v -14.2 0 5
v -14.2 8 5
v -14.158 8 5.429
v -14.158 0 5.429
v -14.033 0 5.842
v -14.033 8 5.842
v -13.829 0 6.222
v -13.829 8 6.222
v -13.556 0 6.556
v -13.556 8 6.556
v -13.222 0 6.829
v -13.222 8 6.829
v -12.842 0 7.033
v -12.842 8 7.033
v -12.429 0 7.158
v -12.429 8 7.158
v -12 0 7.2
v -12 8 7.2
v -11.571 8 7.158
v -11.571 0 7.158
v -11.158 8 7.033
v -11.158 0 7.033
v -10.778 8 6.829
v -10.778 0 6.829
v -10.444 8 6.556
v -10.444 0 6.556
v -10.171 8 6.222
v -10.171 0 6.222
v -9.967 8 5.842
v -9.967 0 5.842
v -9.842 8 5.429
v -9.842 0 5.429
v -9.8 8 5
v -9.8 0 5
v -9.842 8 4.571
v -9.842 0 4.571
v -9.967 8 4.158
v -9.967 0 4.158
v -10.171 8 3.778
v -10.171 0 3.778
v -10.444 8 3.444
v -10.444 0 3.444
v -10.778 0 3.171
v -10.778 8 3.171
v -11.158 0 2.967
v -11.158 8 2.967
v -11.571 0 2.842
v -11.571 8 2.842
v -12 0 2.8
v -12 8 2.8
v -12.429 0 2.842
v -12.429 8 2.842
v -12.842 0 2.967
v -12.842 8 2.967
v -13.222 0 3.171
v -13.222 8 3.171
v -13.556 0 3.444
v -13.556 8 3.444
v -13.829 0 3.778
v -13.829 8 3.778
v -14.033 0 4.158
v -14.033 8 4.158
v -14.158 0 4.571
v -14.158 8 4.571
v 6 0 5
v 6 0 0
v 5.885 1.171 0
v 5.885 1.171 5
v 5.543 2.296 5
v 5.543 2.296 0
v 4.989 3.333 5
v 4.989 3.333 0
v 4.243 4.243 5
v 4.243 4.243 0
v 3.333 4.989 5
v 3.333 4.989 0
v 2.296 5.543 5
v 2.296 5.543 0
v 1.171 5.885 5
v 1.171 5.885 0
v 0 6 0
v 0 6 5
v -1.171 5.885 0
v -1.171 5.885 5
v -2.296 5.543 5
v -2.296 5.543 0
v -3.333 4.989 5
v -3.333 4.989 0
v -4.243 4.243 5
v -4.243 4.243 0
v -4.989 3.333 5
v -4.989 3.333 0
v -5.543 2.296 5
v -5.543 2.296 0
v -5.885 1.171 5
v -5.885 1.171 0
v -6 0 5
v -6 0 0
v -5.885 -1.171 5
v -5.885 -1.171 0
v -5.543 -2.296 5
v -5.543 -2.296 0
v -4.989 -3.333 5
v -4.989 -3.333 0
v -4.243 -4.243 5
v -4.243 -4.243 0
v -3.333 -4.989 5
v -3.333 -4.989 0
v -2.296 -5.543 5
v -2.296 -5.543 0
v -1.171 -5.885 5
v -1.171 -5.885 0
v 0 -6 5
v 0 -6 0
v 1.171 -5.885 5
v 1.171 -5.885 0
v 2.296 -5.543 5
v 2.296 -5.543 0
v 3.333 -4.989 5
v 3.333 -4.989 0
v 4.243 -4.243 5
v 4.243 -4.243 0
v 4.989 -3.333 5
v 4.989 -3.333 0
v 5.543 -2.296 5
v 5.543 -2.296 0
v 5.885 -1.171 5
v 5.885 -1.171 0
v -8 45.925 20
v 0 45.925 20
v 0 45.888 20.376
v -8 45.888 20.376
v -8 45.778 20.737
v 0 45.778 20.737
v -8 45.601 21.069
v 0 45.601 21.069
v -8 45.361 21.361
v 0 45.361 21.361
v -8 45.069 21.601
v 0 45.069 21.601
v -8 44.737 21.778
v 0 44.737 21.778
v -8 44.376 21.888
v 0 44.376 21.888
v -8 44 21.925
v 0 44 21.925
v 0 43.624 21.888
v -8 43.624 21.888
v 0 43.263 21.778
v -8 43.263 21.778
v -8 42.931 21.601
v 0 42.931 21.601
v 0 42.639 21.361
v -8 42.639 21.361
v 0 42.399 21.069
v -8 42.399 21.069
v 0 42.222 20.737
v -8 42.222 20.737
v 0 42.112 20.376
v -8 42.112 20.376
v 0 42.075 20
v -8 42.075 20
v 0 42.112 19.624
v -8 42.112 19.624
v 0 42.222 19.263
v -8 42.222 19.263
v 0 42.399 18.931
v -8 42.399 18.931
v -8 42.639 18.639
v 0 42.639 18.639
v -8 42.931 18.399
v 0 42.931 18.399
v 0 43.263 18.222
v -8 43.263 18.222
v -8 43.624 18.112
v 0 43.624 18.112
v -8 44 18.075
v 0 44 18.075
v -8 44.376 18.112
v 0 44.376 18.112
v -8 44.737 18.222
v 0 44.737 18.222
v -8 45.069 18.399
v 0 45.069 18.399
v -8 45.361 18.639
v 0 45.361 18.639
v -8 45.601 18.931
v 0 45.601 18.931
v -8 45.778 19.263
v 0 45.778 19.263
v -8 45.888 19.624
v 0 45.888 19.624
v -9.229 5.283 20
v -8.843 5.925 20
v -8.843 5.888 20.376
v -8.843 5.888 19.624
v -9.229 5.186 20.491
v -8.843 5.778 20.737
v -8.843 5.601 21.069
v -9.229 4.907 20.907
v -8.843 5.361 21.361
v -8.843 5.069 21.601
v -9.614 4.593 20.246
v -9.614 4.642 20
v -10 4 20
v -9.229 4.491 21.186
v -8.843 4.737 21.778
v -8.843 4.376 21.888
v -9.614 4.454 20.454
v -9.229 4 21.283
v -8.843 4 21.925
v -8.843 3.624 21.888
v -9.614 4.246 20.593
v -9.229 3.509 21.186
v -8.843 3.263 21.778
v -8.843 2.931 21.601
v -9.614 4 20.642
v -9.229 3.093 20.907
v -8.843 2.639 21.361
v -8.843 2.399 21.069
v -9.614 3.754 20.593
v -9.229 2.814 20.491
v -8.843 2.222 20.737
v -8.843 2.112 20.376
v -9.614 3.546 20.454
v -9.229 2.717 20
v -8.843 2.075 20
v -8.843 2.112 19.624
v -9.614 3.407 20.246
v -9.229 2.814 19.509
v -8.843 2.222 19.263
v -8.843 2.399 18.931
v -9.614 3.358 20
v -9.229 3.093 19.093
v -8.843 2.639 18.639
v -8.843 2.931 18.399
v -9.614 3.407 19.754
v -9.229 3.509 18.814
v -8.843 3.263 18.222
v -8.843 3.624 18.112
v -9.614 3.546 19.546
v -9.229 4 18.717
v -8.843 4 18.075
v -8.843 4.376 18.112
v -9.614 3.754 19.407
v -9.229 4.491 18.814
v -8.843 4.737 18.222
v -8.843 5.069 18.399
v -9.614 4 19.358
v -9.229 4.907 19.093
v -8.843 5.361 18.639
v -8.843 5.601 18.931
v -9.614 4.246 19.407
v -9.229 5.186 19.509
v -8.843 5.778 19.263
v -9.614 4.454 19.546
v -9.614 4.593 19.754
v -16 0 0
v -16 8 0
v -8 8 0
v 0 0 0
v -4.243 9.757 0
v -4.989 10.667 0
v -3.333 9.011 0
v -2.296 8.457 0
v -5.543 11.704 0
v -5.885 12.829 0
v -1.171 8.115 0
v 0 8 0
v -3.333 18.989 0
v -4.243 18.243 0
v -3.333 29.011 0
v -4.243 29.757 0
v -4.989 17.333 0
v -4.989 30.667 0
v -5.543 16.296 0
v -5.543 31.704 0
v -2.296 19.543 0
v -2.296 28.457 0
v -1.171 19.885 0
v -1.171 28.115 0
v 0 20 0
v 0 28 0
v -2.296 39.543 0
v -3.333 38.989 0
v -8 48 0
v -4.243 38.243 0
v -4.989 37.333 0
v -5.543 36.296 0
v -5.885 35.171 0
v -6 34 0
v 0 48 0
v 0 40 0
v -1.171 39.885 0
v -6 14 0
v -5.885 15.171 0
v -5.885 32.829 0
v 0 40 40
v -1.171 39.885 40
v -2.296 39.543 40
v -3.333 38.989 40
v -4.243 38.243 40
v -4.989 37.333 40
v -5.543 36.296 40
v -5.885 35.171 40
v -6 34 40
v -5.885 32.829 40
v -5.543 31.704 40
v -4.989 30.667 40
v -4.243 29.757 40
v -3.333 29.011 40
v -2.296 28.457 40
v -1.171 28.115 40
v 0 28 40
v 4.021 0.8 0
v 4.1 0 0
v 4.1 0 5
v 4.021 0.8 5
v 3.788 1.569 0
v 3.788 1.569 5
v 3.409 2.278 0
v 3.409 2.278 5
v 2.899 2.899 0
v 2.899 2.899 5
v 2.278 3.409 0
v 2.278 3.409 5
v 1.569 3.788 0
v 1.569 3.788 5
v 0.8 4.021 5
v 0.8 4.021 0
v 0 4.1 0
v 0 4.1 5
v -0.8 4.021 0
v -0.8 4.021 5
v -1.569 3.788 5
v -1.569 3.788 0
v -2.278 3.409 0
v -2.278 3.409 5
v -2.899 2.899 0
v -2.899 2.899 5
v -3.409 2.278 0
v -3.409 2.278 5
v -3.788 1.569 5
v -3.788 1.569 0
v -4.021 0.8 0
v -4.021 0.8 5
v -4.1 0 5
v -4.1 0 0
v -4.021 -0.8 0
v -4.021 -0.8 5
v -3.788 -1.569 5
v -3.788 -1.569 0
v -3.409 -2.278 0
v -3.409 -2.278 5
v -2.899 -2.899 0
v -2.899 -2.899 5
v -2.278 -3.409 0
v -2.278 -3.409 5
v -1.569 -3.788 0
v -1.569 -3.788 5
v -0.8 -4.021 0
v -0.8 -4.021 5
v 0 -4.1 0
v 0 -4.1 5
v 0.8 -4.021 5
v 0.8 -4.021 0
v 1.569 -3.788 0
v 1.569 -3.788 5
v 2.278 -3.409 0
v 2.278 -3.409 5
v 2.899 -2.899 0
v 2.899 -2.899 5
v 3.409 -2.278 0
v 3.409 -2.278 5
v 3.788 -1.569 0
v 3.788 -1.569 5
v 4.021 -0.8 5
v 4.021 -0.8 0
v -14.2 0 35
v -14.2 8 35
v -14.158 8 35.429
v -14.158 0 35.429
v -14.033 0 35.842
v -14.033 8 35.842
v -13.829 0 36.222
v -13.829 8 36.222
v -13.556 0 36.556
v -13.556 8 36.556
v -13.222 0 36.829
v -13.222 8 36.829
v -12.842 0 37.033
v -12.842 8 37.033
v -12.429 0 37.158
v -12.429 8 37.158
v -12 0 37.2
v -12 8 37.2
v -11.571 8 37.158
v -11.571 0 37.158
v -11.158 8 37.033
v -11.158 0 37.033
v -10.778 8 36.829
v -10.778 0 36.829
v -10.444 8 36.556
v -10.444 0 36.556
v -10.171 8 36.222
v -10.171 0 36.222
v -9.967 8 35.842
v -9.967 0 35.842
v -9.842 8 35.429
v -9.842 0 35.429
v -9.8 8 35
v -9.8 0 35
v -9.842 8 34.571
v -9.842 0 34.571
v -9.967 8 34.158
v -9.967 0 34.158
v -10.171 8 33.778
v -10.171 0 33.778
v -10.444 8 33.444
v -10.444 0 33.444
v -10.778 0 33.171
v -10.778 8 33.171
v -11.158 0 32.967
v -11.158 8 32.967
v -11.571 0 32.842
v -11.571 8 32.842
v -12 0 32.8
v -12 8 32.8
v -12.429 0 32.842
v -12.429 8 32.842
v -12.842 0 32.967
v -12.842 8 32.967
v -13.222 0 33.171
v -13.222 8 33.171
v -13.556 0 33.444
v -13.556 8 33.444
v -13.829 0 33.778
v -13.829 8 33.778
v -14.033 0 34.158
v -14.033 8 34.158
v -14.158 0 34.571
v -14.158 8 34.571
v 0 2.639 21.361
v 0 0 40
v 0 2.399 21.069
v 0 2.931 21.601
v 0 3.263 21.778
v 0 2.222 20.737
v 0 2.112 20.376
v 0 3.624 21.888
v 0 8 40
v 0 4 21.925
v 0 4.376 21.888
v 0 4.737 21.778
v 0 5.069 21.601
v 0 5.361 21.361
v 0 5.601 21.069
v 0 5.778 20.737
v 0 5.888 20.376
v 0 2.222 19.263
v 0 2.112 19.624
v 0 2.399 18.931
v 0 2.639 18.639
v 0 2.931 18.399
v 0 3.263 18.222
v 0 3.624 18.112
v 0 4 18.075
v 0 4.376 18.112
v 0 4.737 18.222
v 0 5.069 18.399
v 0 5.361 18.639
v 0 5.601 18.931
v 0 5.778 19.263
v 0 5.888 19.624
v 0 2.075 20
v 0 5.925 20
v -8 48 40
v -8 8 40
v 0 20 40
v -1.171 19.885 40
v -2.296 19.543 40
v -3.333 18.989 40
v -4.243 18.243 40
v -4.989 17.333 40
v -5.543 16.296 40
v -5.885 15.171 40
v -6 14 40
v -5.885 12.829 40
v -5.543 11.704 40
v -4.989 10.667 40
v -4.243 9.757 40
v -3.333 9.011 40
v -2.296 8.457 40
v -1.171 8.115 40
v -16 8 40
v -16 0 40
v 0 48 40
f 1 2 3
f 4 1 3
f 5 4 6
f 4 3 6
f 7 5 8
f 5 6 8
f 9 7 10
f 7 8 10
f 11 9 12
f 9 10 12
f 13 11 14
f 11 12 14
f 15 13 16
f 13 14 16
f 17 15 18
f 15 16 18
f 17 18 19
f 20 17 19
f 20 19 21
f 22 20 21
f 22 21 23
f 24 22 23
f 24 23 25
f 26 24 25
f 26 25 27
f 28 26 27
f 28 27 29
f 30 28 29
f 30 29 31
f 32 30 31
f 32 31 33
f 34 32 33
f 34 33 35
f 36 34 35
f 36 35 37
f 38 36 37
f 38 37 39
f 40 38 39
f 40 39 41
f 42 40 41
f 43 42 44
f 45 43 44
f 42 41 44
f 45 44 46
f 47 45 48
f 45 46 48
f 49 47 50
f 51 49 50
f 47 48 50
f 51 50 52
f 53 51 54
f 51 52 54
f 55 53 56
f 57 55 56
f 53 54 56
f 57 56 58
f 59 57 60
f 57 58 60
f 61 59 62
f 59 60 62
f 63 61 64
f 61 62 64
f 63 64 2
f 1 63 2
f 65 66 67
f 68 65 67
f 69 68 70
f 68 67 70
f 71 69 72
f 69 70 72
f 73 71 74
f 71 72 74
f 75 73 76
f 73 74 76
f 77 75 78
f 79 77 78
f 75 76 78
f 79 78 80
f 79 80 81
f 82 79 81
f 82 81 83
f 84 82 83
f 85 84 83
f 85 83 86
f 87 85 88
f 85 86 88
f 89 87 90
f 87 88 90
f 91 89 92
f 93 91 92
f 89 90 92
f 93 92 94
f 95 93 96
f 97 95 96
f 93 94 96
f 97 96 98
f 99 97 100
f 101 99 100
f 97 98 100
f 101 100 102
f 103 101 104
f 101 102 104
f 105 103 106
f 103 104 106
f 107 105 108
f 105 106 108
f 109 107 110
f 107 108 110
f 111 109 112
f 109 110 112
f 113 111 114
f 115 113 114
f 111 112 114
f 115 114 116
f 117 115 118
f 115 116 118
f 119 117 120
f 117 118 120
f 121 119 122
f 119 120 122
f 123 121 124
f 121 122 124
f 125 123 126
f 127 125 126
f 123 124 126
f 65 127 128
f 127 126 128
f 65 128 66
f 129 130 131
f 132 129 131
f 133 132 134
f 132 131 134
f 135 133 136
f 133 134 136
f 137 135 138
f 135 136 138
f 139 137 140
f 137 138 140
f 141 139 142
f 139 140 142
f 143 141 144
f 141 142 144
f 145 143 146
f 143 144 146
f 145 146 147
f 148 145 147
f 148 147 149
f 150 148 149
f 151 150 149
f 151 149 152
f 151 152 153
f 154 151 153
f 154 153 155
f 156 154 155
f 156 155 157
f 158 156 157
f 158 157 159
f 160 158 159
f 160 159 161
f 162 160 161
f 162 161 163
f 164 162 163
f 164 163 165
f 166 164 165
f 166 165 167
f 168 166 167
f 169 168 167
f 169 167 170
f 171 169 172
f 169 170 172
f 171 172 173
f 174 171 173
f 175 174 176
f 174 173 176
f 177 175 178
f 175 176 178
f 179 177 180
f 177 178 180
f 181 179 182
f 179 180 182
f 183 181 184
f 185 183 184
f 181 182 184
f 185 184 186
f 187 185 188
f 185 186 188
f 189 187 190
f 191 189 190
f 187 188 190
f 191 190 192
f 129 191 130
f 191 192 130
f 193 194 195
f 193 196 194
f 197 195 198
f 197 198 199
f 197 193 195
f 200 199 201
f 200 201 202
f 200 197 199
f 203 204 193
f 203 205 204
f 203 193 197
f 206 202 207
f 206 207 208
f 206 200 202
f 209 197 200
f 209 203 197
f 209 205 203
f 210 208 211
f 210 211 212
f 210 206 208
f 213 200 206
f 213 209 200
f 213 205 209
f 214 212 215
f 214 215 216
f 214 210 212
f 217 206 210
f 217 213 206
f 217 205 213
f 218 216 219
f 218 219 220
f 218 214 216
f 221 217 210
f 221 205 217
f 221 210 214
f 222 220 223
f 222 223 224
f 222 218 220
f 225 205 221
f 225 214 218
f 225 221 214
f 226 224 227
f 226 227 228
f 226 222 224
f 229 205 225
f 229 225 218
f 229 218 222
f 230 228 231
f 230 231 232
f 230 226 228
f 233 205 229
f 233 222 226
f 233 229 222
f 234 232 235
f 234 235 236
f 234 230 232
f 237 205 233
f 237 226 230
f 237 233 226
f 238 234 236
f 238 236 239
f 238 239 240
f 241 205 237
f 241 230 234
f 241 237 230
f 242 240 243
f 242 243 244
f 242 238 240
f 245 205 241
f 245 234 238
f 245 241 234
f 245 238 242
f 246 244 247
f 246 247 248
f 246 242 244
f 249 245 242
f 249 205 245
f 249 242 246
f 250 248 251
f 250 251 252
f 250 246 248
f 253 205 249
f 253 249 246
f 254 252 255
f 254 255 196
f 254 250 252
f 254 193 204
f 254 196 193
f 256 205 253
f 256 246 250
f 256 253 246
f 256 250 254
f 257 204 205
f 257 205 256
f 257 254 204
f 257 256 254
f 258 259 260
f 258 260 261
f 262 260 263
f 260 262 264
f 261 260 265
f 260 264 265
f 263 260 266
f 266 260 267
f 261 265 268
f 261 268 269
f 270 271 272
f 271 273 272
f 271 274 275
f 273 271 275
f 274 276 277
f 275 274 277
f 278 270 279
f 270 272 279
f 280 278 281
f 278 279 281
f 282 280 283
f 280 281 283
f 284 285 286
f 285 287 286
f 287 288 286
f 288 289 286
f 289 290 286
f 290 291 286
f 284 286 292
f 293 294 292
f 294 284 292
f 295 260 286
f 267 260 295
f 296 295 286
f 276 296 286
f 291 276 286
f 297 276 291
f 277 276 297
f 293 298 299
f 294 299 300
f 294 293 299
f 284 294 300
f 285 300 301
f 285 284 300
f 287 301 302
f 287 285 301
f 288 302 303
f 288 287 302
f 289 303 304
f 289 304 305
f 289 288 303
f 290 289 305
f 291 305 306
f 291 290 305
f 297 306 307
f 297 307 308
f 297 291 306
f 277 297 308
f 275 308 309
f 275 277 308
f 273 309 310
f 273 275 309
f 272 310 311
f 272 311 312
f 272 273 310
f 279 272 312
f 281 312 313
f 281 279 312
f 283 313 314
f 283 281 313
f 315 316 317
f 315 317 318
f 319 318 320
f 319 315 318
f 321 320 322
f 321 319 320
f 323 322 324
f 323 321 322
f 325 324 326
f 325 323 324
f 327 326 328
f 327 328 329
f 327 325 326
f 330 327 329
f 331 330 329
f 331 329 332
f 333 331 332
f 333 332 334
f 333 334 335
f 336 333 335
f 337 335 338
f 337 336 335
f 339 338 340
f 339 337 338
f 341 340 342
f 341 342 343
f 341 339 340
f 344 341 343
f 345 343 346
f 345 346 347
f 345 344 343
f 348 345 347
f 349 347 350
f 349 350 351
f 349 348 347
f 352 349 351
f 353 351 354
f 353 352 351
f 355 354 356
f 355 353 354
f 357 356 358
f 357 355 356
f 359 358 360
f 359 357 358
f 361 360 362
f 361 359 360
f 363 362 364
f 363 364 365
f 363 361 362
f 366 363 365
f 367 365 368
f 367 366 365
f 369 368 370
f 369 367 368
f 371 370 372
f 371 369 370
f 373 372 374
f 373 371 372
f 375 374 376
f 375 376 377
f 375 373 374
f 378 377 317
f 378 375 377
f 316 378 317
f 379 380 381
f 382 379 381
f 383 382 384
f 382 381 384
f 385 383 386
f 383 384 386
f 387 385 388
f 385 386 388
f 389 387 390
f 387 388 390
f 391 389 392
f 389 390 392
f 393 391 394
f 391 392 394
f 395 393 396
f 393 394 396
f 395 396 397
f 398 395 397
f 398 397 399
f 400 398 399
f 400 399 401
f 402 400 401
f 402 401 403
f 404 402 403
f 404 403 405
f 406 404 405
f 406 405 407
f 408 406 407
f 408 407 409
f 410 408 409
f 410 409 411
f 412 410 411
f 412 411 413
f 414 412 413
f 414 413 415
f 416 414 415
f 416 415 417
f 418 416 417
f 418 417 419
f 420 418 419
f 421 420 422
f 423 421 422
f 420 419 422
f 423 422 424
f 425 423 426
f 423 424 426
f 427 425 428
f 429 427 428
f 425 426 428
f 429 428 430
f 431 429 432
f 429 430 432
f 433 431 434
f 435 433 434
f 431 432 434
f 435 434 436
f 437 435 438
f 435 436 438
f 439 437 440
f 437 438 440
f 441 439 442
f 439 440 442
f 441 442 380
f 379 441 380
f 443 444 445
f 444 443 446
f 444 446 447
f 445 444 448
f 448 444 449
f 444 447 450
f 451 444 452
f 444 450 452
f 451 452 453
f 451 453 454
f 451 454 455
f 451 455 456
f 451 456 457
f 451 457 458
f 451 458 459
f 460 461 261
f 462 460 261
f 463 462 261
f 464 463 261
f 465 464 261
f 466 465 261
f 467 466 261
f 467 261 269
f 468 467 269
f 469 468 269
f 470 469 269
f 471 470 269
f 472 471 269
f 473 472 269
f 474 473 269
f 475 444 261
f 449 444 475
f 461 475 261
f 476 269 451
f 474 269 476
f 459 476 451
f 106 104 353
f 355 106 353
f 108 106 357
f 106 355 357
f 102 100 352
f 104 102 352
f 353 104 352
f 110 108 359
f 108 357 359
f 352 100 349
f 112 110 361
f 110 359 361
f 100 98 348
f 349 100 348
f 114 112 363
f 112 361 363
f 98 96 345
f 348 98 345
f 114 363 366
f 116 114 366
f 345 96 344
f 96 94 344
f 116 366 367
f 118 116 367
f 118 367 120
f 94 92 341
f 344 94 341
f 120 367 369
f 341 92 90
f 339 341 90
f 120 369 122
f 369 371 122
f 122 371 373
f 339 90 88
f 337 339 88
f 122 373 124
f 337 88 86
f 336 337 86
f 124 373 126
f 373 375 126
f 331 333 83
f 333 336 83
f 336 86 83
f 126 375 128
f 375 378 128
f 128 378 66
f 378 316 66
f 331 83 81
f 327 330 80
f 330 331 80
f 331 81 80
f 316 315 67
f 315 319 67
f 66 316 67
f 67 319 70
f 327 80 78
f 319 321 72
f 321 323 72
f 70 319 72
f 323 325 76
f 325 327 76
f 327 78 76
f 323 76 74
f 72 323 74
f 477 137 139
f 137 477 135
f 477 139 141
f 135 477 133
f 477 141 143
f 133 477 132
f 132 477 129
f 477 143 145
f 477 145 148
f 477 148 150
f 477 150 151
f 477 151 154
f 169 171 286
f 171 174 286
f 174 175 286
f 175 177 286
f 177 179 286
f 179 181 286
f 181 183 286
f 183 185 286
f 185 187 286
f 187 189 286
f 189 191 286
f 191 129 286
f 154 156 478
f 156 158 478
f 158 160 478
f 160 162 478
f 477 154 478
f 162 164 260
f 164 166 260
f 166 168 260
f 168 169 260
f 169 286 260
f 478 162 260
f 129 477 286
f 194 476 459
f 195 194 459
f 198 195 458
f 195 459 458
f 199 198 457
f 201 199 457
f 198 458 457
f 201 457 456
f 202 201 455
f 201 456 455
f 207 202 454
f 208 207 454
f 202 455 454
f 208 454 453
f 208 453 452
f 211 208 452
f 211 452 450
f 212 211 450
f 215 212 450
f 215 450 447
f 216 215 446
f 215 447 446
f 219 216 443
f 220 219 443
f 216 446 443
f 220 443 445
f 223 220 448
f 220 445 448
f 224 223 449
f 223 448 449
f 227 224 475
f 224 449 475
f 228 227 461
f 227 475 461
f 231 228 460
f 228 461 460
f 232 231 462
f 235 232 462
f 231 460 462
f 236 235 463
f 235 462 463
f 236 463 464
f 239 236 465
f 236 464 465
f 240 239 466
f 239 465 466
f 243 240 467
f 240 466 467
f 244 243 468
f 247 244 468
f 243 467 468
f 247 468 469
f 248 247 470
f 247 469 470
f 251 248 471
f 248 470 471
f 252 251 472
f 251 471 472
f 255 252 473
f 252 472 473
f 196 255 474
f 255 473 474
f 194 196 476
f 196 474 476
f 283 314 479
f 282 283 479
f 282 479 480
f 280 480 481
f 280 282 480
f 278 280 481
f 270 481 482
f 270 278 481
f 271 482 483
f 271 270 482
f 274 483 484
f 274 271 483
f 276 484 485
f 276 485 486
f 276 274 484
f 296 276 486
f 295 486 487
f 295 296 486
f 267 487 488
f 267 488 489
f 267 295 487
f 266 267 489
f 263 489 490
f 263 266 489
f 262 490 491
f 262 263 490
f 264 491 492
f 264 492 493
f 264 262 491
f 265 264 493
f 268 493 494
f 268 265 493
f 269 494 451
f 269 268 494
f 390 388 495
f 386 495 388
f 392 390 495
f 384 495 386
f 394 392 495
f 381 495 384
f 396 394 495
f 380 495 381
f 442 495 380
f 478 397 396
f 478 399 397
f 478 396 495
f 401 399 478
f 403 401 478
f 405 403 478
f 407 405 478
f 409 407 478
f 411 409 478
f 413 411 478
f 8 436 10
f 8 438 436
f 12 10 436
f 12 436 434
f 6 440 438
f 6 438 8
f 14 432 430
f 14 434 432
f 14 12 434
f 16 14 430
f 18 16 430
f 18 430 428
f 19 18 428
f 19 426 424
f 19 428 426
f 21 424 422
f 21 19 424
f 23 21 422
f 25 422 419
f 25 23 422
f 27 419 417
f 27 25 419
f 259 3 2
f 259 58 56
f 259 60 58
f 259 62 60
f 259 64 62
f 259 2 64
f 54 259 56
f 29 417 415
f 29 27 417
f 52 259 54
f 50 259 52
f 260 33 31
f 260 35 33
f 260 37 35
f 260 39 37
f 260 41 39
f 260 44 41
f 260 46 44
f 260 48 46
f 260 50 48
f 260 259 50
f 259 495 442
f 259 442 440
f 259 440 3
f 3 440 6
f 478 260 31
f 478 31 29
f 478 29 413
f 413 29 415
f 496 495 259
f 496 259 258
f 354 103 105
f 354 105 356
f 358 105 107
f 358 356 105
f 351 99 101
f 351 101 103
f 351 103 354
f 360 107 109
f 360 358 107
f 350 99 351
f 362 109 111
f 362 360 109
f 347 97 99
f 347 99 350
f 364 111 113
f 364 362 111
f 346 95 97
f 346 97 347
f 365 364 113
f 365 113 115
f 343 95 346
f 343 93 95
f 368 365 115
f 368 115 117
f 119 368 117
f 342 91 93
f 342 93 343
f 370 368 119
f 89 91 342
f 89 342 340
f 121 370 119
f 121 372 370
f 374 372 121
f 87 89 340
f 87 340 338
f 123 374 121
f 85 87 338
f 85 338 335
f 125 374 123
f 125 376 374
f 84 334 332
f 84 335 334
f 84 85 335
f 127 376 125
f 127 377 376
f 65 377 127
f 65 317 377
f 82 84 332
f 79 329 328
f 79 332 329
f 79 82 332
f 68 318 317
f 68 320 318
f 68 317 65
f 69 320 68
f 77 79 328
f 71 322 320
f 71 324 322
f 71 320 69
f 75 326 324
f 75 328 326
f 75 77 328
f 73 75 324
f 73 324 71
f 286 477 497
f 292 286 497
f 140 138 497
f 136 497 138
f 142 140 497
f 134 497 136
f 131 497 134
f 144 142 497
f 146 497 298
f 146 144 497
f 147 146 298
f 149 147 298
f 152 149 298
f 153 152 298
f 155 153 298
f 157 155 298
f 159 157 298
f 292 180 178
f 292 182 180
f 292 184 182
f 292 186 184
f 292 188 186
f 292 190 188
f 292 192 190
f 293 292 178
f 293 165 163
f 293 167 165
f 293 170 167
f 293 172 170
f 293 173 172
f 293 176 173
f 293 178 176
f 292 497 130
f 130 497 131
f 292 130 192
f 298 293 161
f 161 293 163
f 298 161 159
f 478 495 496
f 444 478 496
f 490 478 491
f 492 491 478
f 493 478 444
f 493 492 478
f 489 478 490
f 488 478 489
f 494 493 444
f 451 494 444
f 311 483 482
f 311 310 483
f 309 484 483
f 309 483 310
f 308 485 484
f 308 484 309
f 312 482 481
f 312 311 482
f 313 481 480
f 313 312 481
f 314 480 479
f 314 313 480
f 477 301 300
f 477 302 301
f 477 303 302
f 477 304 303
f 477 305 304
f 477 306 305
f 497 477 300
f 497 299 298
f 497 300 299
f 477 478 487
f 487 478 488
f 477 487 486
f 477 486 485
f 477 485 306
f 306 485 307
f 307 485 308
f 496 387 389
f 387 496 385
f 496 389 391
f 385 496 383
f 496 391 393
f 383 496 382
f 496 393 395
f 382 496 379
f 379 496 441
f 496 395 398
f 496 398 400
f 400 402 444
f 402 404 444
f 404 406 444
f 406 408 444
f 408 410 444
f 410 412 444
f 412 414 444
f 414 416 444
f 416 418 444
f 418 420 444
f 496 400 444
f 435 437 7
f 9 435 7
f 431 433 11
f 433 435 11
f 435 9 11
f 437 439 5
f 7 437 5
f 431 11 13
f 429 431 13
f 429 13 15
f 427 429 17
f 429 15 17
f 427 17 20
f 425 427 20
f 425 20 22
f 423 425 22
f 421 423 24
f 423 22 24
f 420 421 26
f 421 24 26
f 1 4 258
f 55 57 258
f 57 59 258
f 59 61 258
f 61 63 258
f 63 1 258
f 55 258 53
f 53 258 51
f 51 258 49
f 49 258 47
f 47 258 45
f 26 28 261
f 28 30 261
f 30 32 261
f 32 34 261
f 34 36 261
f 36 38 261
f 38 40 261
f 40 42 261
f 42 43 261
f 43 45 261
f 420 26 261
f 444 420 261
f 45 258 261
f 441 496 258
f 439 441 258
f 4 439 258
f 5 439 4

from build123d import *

# Parameters (mm, degrees)
PAD001_DEPTH  = 40
SKETCH005_R   = 2.2
HOLE003_DEPTH = 25
SKETCH004_R   = 1.925
HOLE_DEPTH    = 8.843343
HOLE_TIPS_R   = 1.925
SKETCH_R      = 6
SKETCH_R_2    = 4.1
PAD_DEPTH     = 5


with BuildPart() as mount:
    # Sketch003 → Pad001 (new body)
    with BuildSketch(Plane.XY):
        with BuildLine():
            Line((-16, 8), (-16, 0))
            Line((-16, 0), (0, 0))
            Line((0, 0), (0, 8))
            ThreePointArc((0, 20), (-6, 14), (0, 8))
            Line((0, 28), (0, 20))
            ThreePointArc((0, 40), (-6, 34), (0, 28))
            Line((0, 48), (0, 40))
            Line((-8, 48), (0, 48))
            Line((-8, 48), (-8, 8))
            Line((-16, 8), (-8, 8))
        make_face()
    extrude(amount=PAD001_DEPTH)

    # Sketch005 → Hole003 (cut)
    with BuildSketch(Plane(origin=(0, 8, 0), x_dir=(-1, 0, 0), z_dir=(0, 1, 0))):
        with Locations((12, 5)):
            Circle(SKETCH005_R)
        with Locations((12, 35)):
            Circle(SKETCH005_R)
    extrude(amount=-HOLE003_DEPTH, mode=Mode.SUBTRACT)

    # Sketch004 (on Face9 of Pad001) → Hole (cut)
    with BuildSketch(Plane.YZ):
        with Locations((4, 20)):
            Circle(SKETCH004_R)
        with Locations((44, 20)):
            Circle(SKETCH004_R)
    extrude(amount=-HOLE_DEPTH, mode=Mode.SUBTRACT)

    # Hole tips → Hole tip 1 section 0
    with BuildSketch(Plane.YZ.offset(-8.843343), mode=Mode.PRIVATE) as hole_tip_1_s0:
        with Locations((4, 20)):
            Circle(HOLE_TIPS_R)
    loft([hole_tip_1_s0.sketch, Vertex(-10, 4, 20)], mode=Mode.SUBTRACT)

    # Hole tips → Hole tip 2 section 0
    with BuildSketch(Plane.YZ.offset(-8.843343), mode=Mode.PRIVATE) as hole_tip_2_s0:
        with Locations((44, 20)):
            Circle(HOLE_TIPS_R)
    loft([hole_tip_2_s0.sketch, Vertex(-10, 44, 20)], mode=Mode.SUBTRACT)


with BuildPart() as adapter:
    # Sketch → Pad (new body)
    with BuildSketch(Plane.XY):
        Circle(SKETCH_R)
        Circle(SKETCH_R_2, mode=Mode.SUBTRACT)
    extrude(amount=PAD_DEPTH)


solid = Compound([mount.part, adapter.part])
